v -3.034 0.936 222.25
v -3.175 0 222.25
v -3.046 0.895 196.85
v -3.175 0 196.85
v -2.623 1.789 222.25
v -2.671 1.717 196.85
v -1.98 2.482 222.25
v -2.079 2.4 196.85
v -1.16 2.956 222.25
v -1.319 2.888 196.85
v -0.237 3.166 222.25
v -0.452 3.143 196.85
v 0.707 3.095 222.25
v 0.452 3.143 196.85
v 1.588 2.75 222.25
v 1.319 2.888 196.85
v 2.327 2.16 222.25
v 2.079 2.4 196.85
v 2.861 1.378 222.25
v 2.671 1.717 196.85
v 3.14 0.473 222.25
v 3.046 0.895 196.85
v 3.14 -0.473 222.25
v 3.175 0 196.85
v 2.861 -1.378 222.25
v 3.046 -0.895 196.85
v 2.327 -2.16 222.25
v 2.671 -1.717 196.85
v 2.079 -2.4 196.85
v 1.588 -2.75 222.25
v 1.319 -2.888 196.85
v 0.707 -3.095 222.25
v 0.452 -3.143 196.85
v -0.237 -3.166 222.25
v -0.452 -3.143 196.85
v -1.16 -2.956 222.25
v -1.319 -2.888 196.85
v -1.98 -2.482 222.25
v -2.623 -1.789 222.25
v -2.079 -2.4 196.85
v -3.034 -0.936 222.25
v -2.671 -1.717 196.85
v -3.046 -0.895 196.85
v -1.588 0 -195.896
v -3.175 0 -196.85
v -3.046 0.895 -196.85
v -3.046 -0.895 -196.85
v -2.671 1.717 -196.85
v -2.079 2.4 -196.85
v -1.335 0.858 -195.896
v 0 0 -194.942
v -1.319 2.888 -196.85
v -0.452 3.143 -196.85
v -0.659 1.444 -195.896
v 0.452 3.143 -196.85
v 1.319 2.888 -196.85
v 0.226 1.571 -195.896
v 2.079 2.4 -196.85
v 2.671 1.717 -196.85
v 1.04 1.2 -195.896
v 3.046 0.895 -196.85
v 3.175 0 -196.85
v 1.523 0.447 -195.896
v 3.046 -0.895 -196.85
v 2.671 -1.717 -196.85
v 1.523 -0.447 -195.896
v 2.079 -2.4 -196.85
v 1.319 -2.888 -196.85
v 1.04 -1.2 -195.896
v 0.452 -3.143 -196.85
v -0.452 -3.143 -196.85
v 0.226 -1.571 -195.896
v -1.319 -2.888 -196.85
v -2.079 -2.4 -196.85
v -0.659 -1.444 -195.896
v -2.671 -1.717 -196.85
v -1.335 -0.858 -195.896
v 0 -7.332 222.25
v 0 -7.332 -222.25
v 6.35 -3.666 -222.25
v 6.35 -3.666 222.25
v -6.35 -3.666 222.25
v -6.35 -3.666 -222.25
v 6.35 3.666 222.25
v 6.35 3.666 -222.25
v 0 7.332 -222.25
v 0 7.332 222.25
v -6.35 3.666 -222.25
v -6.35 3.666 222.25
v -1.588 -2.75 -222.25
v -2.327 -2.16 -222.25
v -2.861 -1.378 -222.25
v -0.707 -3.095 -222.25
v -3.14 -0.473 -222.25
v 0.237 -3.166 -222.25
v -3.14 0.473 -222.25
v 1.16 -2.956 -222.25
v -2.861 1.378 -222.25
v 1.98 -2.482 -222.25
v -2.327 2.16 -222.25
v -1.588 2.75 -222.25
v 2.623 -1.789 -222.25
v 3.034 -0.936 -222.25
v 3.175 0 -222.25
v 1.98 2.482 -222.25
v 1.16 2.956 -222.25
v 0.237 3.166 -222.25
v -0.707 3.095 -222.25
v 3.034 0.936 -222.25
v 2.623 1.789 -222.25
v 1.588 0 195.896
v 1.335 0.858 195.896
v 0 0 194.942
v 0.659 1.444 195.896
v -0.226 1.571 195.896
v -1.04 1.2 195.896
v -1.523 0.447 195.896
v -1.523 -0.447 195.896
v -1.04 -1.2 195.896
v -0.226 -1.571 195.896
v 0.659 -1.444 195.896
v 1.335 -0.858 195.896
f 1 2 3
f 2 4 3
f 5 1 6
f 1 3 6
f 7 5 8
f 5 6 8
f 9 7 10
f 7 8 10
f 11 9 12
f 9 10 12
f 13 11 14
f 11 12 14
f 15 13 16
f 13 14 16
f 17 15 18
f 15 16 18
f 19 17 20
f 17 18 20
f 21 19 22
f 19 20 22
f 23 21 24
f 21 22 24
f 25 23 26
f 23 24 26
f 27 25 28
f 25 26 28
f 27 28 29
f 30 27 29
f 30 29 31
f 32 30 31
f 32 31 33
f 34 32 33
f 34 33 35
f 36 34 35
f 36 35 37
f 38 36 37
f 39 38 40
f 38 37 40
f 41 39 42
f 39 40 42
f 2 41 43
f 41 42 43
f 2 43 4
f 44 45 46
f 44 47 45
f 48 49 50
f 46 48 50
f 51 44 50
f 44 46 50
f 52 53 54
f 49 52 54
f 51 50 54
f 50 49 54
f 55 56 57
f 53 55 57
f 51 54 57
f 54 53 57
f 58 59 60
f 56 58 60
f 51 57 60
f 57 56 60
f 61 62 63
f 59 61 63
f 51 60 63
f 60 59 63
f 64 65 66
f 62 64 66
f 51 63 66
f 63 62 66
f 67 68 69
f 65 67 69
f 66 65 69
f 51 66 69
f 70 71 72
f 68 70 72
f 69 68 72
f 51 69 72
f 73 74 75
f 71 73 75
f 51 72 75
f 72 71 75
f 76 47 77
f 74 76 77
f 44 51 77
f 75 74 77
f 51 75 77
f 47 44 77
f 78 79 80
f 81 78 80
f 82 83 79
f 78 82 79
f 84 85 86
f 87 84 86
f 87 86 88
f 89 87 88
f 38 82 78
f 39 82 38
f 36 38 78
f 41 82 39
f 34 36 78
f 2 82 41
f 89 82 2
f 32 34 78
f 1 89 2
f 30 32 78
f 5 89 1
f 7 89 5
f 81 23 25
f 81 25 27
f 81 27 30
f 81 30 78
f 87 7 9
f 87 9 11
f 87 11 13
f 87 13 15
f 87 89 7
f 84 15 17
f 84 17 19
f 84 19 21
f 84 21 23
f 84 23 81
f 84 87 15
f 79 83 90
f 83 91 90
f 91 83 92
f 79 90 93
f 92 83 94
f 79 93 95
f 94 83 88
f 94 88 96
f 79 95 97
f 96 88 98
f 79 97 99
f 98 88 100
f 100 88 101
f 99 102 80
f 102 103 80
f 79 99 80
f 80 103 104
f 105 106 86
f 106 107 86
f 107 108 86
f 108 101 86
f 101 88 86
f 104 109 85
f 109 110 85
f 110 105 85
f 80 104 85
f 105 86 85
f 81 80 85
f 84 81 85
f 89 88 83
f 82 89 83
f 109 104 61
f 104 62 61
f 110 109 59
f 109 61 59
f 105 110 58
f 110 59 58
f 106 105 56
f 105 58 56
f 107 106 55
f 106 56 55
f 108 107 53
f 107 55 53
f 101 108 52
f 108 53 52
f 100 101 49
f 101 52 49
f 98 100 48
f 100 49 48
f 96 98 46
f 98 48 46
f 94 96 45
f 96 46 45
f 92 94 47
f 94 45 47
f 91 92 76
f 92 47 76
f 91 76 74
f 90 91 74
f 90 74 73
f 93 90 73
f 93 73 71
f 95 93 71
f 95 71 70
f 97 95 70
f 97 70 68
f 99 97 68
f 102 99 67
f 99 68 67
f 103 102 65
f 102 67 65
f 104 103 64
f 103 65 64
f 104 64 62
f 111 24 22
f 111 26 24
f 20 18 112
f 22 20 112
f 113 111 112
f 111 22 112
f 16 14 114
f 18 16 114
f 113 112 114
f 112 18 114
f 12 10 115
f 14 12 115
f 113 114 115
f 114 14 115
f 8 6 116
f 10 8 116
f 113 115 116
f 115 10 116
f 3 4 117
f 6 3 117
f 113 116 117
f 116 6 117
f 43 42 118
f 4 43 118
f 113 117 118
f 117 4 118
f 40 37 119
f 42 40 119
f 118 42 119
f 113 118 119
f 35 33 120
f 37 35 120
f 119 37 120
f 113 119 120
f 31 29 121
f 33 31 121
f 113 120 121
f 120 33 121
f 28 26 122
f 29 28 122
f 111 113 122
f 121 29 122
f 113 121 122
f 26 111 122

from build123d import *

# Parameters (mm, degrees)
BOSS_EXTRUDE2_DEPTH             = 222.249999
BOSS_EXTRUDE2_DEPTH_BACK        = 222.249999
F_1_4_0_25_DIAMETER_HOLE1_D     = 6.35
F_1_4_0_25_DIAMETER_HOLE1_DEPTH = 25.4
F_1_4_0_25_DIAMETER_HOLE1_TIP   = 1.907732465
F_1_4_0_25_DIAMETER_HOLE2_D     = 6.35
F_1_4_0_25_DIAMETER_HOLE2_DEPTH = 25.4
F_1_4_0_25_DIAMETER_HOLE2_TIP   = 1.907732465


with BuildPart() as part:
    # Sketch3 → Boss-Extrude2 (new, two sides: drawn at the far end of the back side and taken through both)
    with BuildSketch(Plane.XY.offset(-BOSS_EXTRUDE2_DEPTH_BACK)):
        Polygon((-6.35, -3.666174209), (0, -7.332348419), (6.35, -3.666174209), (6.35, 3.666174209), (0, 7.332348419), (-6.35, 3.666174209), align=None)
    extrude(amount=BOSS_EXTRUDE2_DEPTH + BOSS_EXTRUDE2_DEPTH_BACK)

    # 1/4 (0.25) Diameter Hole1
    with Locations(Plane.XY.offset(222.249999492)):
        with Locations((0, 0)):
            Hole(F_1_4_0_25_DIAMETER_HOLE1_D / 2, depth=F_1_4_0_25_DIAMETER_HOLE1_DEPTH)
            with Locations((0, 0, -(F_1_4_0_25_DIAMETER_HOLE1_DEPTH + F_1_4_0_25_DIAMETER_HOLE1_TIP / 2))):  # 118° drill point
                Cone(0, F_1_4_0_25_DIAMETER_HOLE1_D / 2, F_1_4_0_25_DIAMETER_HOLE1_TIP, mode=Mode.SUBTRACT)

    # 1/4 (0.25) Diameter Hole2
    with Locations(Plane(origin=(0, 0, -222.249999492), x_dir=(-1, 0, 0), z_dir=(0, 0, -1))):
        with Locations((0, 0)):
            Hole(F_1_4_0_25_DIAMETER_HOLE2_D / 2, depth=F_1_4_0_25_DIAMETER_HOLE2_DEPTH)
            with Locations((0, 0, -(F_1_4_0_25_DIAMETER_HOLE2_DEPTH + F_1_4_0_25_DIAMETER_HOLE2_TIP / 2))):  # 118° drill point
                Cone(0, F_1_4_0_25_DIAMETER_HOLE2_D / 2, F_1_4_0_25_DIAMETER_HOLE2_TIP, mode=Mode.SUBTRACT)


solid = part.part
